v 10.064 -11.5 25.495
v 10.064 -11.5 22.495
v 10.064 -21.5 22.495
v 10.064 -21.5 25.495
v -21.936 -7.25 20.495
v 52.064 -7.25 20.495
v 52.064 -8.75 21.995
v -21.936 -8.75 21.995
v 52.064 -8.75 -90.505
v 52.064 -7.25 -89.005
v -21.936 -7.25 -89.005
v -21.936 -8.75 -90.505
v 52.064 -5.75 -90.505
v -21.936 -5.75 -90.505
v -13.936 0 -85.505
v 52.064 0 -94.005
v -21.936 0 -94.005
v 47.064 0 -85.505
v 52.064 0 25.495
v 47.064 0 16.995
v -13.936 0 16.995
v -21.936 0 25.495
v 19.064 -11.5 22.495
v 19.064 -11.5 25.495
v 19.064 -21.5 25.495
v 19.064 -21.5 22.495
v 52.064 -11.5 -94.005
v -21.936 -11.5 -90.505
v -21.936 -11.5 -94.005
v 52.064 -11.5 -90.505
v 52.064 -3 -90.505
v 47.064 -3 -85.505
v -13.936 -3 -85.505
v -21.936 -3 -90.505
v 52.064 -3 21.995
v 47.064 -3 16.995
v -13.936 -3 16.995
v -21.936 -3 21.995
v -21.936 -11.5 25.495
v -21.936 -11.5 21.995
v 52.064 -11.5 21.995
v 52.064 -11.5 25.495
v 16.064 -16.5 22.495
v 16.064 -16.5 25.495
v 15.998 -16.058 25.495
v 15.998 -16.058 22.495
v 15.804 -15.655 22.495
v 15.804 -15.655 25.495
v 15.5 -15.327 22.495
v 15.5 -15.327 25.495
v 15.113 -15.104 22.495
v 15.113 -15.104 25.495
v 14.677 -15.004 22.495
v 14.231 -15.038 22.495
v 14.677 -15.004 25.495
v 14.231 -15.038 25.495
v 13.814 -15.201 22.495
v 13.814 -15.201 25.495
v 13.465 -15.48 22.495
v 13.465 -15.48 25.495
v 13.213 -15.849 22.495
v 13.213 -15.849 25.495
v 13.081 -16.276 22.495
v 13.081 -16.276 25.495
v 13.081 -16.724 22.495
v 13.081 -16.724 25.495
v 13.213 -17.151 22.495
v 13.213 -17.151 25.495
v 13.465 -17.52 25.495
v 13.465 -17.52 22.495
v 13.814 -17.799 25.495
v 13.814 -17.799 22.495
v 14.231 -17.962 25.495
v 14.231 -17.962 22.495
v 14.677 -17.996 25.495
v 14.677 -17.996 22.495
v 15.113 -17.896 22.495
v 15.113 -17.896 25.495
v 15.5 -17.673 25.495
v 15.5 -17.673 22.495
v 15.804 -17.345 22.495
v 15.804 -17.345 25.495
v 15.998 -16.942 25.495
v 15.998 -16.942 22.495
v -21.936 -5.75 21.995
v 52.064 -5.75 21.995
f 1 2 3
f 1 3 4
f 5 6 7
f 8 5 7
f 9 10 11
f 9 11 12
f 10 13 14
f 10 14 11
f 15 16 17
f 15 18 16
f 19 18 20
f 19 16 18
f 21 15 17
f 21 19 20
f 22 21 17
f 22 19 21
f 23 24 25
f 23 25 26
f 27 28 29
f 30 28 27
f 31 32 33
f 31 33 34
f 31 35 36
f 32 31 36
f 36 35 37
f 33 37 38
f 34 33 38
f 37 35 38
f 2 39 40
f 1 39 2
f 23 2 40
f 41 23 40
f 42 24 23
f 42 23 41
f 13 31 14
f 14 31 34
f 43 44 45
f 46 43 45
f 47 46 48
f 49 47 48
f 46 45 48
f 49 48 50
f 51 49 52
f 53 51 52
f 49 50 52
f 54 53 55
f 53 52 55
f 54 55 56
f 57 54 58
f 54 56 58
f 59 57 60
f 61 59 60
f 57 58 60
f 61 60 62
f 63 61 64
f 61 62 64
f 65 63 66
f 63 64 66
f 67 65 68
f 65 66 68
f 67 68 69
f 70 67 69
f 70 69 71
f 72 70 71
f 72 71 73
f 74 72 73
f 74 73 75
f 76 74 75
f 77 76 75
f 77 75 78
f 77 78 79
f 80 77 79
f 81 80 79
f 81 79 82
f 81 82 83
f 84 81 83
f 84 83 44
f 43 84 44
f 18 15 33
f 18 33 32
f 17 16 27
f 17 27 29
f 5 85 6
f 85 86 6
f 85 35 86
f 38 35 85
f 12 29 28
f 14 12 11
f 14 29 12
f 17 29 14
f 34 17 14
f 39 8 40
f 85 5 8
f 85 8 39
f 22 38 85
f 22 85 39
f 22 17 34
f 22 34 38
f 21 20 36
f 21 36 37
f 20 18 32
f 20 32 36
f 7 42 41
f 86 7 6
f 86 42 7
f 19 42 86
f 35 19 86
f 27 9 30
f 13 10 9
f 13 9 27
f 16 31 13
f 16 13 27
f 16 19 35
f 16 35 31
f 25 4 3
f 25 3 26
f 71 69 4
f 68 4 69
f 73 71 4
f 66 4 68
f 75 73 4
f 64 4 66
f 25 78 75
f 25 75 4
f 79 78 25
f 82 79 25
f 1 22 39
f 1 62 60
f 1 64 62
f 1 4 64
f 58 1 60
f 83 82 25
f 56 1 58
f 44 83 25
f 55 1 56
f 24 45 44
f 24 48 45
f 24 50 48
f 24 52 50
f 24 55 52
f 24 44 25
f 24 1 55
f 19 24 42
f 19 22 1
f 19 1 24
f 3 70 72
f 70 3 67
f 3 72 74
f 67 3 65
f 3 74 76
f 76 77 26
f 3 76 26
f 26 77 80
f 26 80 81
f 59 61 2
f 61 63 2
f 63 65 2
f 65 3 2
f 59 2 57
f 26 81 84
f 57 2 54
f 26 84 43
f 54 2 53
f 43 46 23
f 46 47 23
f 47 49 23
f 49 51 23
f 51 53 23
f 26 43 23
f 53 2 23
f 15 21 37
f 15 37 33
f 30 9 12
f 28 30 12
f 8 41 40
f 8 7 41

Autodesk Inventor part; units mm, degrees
ref_plane "YZ Plane" through (0, 0, 0) normal (1, 0, 0) x (0, 1, 0)
ref_plane "XZ Plane" through (0, 0, 0) normal (0, 1, 0) x (-1, 0, 0)
ref_plane "XY Plane" through (0, 0, 0) normal (0, 0, 1) x (1, 0, 0)
sketch "Sketch1" plane through (0, 0, 0) normal (0, 1, 0) x (-1, 0, 0)
  line L0 (21.9355, 25.495) -> (-52.0645, 25.495)
  line L1 (-52.0645, 25.495) -> (-52.0645, -94.005)
  line L2 (-52.0645, -94.005) -> (21.9355, -94.005)
  line L3 (21.9355, -94.005) -> (21.9355, 25.495)
  point P0 (0, 0)
  dimension "d0" = 119.5
  dimension "d1" = 74
extrude "Extrusion1" add sketch "Sketch1" against normal blind 3
sketch "Sketch2" plane through (0, 0, 0) normal (0, 1, 0) x (1, 0, 0)
  line L0 (-13.9355, -16.995) -> (-13.9355, 85.505)
  line L1 (-13.9355, 85.505) -> (47.0645, 85.505)
  line L2 (-21.9355, 94.005) -> (52.0645, 94.005) projected
  line L3 (47.0645, 85.505) -> (47.0645, -16.995)
  line L4 (47.0645, -16.995) -> (-13.9355, -16.995)
  line L5 (-21.9355, -25.495) -> (52.0645, -25.495) projected
  line L6 (-21.9355, 94.005) -> (-21.9355, -25.495) projected
  line L7 (52.0645, -25.495) -> (52.0645, 94.005) projected
  point P0 (0, 0)
  dimension "d4" = 8.5
  dimension "d5" = 8.5
  dimension "d6" = 8
  dimension "d7" = 5
extrude "Extrusion2" cut sketch "Sketch2" against normal blind 3 contours L0 L1 L3 L4
sketch "Sketch7" plane through (0, -3, 0) normal (0, -1, 0) x (1, 0, 0)
  line L0 (52.0645, 25.495) -> (-21.9355, 25.495) projected
  line L1 (52.0645, 25.495) -> (52.0645, 21.995)
  line L2 (52.0645, -94.005) -> (52.0645, 25.495) projected
  line L3 (52.0645, 21.995) -> (-21.9355, 21.995)
  line L4 (-21.9355, 21.995) -> (-21.9355, 25.495)
  line L5 (-21.9355, 25.495) -> (52.0645, 25.495)
  line L6 (52.0645, -94.005) -> (52.0645, -90.505)
  line L7 (52.0645, -90.505) -> (-21.9355, -90.505)
  line L8 (-21.9355, -90.505) -> (-21.9355, -94.005)
  line L9 (-21.9355, -94.005) -> (52.0645, -94.005)
  point P0 (0, 0)
  point P1 (-21.9355, 25.495)
  dimension "d82" = 3.5
  dimension "d83" = 74
  dimension "d84" = 3.5
  dimension "d107" = 74
extrude "Extrusion7" add sketch "Sketch7" along normal blind 8.5
sketch "Sketch8" plane through (52.0645, 0, 25.495) normal (1, 0, 0) x (0, 0, -1)
  line L0 (3.5, -3) -> (3.5, -11.5) projected
  line L1 (3.5, -5.75) -> (5, -7.25)
  line L2 (5, -7.25) -> (3.5, -8.75)
  line L3 (116, -3) -> (3.5, -3) projected
  line L4 (116, -3) -> (116, -11.5) projected
  line L5 (116, -5.75) -> (114.5, -7.25)
  line L6 (114.5, -7.25) -> (116, -8.75)
  point P0 (25.495, 0)
  dimension "d87" = 45
  dimension "d88" = 1.5
  dimension "d89" = 4.25
  dimension "d90" = 45
  dimension "d91" = 45
  dimension "d92" = 4.25
  dimension "d93" = 1.5
extrude "Extrusion8" add sketch "Sketch8" against normal blind 74
sketch "Sketch9" plane through (0, -11.5, 0) normal (0, -1, 0) x (1, 0, 0)
  line L0 (-21.9355, 25.495) -> (52.0645, 25.495) projected
  line L1 (10.0645, 25.495) -> (19.0645, 25.495)
  line L2 (19.0645, 25.495) -> (19.0645, 22.495)
  line L3 (10.0645, 22.495) -> (10.0645, 25.495)
  line L4 (52.0645, 21.995) -> (52.0645, 25.495) projected
  line L5 (-21.9355, 25.495) -> (-21.9355, 21.995) projected
  line L6 (10.0645, 22.495) -> (19.0645, 22.495)
  line L7 (52.0645, 21.995) -> (-21.9355, 21.995) projected
  point P0 (0, 0)
  dimension "d96" = 9
  dimension "d97" = 3
  dimension "d99" = 32
extrude "Extrusion9" add sketch "Sketch9" along normal blind 10 contours L0 L2 L6 L3
sketch "Sketch10" plane through (-21.9355, 0, 25.495) normal (0, 0, 1) x (1, 0, 0)
  circle A0 centre (36.5, -16.5) radius 1.5
  line L0 (41, -21.5) -> (32, -21.5) projected
  line L1 (32, -11.5) -> (32, -21.5) projected
  point P0 (21.9355, 0)
  dimension "d102" = 3
  dimension "d103" = 5
  dimension "d104" = 4.5
extrude "Extrusion10" cut sketch "Sketch10" against normal blind 10
properties part number "plate top"
